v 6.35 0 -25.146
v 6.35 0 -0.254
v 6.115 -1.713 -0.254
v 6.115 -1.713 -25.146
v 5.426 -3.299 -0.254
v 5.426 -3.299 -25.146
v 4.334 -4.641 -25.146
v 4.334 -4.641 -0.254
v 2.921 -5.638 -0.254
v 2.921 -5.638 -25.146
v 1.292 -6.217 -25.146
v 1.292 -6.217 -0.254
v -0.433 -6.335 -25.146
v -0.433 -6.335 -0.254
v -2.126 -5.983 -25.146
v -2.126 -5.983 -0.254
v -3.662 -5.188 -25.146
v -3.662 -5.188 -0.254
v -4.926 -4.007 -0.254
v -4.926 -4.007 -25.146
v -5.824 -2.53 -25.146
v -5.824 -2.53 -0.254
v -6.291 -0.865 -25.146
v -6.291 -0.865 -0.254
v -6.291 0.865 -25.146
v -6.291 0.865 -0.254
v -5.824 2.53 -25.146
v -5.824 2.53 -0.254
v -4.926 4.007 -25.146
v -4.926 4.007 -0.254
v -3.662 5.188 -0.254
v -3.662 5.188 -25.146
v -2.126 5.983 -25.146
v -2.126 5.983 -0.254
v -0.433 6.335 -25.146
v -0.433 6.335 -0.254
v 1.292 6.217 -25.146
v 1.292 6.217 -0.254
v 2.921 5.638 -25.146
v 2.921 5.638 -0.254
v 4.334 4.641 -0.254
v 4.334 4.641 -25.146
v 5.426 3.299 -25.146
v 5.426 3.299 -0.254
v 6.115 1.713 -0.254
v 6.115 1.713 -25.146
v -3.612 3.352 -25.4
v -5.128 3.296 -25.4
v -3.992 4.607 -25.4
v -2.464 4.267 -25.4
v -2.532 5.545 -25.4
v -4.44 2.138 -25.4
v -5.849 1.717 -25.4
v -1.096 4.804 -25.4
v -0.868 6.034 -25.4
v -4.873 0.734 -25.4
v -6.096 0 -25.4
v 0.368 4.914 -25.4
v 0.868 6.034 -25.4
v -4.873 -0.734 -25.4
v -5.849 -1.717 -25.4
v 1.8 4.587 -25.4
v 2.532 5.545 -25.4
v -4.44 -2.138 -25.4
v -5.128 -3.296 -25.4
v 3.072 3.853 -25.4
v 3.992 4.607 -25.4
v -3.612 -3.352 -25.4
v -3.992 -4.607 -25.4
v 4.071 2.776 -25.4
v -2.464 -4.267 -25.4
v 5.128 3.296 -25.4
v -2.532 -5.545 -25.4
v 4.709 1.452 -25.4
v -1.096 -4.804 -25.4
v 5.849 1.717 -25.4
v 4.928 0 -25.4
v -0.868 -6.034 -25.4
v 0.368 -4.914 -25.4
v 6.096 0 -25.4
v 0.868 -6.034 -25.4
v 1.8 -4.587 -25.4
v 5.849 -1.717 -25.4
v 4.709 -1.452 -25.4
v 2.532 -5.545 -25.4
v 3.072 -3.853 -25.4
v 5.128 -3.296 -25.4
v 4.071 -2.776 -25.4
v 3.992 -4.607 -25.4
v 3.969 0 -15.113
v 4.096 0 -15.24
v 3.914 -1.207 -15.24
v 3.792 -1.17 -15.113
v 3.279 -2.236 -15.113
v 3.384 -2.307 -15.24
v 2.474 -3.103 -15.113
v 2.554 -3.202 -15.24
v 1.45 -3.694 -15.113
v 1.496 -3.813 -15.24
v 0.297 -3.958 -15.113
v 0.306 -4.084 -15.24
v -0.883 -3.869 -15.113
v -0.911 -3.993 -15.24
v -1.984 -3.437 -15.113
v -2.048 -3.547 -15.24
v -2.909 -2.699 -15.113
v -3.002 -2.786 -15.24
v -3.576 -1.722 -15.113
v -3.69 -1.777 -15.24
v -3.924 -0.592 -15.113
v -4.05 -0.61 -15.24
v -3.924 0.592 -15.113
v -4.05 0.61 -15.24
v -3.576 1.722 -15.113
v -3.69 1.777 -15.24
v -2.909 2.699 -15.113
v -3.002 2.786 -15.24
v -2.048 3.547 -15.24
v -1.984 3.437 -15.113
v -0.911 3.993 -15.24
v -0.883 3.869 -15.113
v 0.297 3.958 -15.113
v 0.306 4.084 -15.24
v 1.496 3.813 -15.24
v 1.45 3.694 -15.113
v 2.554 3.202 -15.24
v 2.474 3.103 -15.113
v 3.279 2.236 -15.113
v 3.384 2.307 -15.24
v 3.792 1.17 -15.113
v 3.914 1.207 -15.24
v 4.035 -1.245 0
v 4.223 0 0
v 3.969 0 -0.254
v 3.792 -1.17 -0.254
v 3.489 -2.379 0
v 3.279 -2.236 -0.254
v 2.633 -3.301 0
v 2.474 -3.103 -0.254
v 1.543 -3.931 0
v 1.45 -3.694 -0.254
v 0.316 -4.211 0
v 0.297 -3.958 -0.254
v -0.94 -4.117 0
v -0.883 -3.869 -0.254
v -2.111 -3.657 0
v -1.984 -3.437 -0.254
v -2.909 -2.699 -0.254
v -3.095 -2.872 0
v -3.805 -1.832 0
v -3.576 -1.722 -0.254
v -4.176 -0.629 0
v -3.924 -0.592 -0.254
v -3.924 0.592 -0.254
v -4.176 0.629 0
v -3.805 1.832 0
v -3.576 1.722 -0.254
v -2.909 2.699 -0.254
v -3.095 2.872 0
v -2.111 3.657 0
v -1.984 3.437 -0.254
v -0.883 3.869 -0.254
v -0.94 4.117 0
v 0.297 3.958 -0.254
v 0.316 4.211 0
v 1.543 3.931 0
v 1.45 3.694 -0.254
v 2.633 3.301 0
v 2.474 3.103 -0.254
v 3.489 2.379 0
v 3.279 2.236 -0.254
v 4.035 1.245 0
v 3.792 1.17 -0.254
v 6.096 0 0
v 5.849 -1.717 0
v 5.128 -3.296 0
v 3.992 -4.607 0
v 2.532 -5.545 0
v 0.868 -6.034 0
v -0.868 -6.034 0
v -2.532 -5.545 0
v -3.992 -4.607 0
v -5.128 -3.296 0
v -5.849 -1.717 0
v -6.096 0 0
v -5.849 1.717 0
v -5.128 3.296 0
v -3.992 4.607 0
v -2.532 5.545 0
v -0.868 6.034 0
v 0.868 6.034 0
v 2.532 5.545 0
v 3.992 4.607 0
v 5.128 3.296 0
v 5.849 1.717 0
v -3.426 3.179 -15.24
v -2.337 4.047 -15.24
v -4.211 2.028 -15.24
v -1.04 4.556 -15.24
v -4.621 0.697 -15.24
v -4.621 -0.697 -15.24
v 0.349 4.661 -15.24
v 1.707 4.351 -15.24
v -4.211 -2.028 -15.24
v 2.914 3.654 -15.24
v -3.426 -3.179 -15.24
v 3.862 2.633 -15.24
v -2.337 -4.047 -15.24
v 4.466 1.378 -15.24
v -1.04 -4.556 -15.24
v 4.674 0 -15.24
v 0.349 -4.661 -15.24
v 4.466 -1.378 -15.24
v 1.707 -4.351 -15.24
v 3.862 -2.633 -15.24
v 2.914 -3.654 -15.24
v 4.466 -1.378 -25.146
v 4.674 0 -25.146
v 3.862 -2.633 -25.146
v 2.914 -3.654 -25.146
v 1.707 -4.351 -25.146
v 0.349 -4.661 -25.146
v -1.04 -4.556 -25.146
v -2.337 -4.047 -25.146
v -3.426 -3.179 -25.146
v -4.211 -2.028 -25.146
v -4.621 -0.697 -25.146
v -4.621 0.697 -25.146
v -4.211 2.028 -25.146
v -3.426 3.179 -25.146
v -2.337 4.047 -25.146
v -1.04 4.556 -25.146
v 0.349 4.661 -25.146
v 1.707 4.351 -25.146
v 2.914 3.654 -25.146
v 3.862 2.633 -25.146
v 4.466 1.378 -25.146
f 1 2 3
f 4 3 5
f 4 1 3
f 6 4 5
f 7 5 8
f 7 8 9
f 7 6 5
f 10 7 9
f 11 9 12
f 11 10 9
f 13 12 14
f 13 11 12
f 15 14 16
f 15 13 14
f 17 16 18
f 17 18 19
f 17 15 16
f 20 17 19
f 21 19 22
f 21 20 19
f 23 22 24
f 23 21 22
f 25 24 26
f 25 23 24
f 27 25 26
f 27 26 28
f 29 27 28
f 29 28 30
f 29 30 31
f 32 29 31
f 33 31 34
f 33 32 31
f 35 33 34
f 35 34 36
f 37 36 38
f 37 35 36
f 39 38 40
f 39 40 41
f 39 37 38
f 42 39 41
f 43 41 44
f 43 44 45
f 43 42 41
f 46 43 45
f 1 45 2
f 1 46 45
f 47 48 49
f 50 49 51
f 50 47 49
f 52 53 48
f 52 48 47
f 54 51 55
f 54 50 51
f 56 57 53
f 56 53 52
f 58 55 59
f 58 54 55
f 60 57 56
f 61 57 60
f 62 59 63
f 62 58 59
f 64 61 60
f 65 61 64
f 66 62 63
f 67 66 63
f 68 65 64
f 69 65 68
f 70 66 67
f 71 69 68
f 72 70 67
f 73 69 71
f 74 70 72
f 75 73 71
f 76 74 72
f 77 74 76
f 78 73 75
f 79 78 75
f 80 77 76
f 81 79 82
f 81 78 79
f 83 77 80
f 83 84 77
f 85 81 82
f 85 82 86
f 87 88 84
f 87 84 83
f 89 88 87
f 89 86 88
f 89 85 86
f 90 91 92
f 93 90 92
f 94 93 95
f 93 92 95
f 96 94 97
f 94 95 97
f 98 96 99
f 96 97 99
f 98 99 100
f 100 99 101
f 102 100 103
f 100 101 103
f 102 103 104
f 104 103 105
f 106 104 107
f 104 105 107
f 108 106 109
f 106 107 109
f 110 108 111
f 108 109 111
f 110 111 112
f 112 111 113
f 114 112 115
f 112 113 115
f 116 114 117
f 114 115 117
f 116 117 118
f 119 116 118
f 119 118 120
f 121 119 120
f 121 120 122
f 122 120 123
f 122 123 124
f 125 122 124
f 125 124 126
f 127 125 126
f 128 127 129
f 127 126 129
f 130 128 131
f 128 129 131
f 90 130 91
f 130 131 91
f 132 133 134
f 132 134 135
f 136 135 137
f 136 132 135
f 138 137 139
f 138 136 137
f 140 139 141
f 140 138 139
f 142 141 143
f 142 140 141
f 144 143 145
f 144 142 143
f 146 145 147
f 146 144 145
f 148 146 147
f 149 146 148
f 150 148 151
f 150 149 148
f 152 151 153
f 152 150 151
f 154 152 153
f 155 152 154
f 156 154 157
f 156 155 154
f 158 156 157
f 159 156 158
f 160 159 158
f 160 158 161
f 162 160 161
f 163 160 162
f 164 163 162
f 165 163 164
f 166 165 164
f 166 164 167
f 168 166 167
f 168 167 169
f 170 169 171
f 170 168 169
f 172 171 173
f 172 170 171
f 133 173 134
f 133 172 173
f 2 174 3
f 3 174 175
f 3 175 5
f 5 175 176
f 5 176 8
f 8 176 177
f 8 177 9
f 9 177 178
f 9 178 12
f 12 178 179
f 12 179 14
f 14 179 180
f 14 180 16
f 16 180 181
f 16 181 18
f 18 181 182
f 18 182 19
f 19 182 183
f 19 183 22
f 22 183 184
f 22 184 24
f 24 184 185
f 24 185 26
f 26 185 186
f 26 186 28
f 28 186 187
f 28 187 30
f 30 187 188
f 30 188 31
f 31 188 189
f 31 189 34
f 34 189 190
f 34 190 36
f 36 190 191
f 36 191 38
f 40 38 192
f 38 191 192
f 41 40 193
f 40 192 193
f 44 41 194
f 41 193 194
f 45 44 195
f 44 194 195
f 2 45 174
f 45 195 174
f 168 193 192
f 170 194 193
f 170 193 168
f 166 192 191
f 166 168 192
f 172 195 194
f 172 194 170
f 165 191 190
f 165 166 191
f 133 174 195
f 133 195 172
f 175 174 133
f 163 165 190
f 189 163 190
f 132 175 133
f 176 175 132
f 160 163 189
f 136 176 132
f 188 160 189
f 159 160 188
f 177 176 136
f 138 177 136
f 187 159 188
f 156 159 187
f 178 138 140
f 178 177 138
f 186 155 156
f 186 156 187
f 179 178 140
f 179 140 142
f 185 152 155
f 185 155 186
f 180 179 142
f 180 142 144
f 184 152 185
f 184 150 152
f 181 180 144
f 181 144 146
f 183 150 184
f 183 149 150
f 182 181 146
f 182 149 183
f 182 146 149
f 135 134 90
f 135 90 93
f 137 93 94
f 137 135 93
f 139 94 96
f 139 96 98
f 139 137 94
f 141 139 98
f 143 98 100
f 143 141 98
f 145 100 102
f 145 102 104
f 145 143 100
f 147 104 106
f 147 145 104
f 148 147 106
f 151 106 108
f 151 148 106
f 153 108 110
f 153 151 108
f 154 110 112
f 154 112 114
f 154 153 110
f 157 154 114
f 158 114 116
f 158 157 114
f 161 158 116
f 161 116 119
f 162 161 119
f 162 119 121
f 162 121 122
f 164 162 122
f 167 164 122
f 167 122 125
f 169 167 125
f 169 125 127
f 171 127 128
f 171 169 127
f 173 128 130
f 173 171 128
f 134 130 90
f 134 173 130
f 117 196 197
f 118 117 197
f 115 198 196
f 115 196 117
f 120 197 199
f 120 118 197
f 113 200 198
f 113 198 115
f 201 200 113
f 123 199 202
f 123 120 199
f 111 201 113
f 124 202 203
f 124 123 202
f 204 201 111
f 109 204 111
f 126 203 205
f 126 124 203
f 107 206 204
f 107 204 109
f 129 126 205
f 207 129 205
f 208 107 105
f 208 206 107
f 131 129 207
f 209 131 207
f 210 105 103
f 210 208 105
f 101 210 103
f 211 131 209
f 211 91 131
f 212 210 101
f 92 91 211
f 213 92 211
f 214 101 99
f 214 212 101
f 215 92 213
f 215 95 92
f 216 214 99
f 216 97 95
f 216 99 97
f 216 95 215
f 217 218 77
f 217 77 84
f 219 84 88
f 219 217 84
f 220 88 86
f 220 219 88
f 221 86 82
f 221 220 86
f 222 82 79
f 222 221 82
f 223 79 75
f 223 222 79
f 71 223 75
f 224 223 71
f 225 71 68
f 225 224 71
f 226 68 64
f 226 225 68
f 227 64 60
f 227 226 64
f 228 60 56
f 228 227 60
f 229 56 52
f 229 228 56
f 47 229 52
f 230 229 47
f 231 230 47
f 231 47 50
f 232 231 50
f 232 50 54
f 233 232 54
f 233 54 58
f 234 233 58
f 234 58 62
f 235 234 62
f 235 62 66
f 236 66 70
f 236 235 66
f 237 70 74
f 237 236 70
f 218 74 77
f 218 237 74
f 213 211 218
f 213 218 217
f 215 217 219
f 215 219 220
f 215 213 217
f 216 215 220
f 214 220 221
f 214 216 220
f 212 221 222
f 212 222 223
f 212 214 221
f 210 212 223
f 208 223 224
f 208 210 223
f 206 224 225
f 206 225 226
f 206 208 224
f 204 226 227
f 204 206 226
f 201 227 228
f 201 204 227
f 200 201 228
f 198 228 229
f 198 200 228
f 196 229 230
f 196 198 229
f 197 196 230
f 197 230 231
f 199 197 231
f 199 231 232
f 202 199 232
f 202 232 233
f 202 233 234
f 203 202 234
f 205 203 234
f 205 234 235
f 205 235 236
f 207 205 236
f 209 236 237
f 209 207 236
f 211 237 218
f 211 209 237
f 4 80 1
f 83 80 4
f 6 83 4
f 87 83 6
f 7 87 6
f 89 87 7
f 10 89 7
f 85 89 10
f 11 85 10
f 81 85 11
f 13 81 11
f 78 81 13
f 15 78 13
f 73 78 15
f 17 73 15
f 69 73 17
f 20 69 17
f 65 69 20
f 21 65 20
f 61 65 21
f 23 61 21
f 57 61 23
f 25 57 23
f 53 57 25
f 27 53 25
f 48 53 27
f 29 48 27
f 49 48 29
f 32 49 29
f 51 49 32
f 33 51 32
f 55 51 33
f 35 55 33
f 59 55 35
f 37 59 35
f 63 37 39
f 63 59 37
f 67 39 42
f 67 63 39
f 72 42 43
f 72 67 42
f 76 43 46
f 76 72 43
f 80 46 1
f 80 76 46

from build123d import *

# Parameters (mm, degrees)
CHAMFER1_SIZE = 0.254
CHAMFER2_SIZE = 0.127


with BuildPart() as part:
    # Sketch1 → Revolve1 (revolve)
    with BuildSketch(Plane(origin=(0, 0, 0), x_dir=(0, 0, -1), z_dir=(1, 0, 0)), mode=Mode.PRIVATE) as revolve1_sk:
        Polygon((0, 6.35), (25.4, 6.35), (25.4, 4.6736), (15.24, 4.6736), (15.24, 3.96875), (0, 3.96875), align=None)
    revolve(revolve1_sk.sketch.rotate(Axis((0, 0, 0), (0, 0, -1)), 90), axis=Axis((0, 0, 0), (0, 0, -1)))

    # Chamfer1
    chamfer1_edges = [part.edges().sort_by_distance(p)[0] for p in [
        (-3.96875, 0, 0),
        (-4.6736, 0, -25.4),
        (-6.35, 0, -25.4),
        (-6.35, 0, 0),
    ]]
    chamfer(chamfer1_edges, length=CHAMFER1_SIZE)

    # Chamfer2
    chamfer2_edges = [part.edges().sort_by_distance(p)[0] for p in [
        (-3.96875, 0, -15.24),
    ]]
    chamfer(chamfer2_edges, length=CHAMFER2_SIZE)


solid = part.part
